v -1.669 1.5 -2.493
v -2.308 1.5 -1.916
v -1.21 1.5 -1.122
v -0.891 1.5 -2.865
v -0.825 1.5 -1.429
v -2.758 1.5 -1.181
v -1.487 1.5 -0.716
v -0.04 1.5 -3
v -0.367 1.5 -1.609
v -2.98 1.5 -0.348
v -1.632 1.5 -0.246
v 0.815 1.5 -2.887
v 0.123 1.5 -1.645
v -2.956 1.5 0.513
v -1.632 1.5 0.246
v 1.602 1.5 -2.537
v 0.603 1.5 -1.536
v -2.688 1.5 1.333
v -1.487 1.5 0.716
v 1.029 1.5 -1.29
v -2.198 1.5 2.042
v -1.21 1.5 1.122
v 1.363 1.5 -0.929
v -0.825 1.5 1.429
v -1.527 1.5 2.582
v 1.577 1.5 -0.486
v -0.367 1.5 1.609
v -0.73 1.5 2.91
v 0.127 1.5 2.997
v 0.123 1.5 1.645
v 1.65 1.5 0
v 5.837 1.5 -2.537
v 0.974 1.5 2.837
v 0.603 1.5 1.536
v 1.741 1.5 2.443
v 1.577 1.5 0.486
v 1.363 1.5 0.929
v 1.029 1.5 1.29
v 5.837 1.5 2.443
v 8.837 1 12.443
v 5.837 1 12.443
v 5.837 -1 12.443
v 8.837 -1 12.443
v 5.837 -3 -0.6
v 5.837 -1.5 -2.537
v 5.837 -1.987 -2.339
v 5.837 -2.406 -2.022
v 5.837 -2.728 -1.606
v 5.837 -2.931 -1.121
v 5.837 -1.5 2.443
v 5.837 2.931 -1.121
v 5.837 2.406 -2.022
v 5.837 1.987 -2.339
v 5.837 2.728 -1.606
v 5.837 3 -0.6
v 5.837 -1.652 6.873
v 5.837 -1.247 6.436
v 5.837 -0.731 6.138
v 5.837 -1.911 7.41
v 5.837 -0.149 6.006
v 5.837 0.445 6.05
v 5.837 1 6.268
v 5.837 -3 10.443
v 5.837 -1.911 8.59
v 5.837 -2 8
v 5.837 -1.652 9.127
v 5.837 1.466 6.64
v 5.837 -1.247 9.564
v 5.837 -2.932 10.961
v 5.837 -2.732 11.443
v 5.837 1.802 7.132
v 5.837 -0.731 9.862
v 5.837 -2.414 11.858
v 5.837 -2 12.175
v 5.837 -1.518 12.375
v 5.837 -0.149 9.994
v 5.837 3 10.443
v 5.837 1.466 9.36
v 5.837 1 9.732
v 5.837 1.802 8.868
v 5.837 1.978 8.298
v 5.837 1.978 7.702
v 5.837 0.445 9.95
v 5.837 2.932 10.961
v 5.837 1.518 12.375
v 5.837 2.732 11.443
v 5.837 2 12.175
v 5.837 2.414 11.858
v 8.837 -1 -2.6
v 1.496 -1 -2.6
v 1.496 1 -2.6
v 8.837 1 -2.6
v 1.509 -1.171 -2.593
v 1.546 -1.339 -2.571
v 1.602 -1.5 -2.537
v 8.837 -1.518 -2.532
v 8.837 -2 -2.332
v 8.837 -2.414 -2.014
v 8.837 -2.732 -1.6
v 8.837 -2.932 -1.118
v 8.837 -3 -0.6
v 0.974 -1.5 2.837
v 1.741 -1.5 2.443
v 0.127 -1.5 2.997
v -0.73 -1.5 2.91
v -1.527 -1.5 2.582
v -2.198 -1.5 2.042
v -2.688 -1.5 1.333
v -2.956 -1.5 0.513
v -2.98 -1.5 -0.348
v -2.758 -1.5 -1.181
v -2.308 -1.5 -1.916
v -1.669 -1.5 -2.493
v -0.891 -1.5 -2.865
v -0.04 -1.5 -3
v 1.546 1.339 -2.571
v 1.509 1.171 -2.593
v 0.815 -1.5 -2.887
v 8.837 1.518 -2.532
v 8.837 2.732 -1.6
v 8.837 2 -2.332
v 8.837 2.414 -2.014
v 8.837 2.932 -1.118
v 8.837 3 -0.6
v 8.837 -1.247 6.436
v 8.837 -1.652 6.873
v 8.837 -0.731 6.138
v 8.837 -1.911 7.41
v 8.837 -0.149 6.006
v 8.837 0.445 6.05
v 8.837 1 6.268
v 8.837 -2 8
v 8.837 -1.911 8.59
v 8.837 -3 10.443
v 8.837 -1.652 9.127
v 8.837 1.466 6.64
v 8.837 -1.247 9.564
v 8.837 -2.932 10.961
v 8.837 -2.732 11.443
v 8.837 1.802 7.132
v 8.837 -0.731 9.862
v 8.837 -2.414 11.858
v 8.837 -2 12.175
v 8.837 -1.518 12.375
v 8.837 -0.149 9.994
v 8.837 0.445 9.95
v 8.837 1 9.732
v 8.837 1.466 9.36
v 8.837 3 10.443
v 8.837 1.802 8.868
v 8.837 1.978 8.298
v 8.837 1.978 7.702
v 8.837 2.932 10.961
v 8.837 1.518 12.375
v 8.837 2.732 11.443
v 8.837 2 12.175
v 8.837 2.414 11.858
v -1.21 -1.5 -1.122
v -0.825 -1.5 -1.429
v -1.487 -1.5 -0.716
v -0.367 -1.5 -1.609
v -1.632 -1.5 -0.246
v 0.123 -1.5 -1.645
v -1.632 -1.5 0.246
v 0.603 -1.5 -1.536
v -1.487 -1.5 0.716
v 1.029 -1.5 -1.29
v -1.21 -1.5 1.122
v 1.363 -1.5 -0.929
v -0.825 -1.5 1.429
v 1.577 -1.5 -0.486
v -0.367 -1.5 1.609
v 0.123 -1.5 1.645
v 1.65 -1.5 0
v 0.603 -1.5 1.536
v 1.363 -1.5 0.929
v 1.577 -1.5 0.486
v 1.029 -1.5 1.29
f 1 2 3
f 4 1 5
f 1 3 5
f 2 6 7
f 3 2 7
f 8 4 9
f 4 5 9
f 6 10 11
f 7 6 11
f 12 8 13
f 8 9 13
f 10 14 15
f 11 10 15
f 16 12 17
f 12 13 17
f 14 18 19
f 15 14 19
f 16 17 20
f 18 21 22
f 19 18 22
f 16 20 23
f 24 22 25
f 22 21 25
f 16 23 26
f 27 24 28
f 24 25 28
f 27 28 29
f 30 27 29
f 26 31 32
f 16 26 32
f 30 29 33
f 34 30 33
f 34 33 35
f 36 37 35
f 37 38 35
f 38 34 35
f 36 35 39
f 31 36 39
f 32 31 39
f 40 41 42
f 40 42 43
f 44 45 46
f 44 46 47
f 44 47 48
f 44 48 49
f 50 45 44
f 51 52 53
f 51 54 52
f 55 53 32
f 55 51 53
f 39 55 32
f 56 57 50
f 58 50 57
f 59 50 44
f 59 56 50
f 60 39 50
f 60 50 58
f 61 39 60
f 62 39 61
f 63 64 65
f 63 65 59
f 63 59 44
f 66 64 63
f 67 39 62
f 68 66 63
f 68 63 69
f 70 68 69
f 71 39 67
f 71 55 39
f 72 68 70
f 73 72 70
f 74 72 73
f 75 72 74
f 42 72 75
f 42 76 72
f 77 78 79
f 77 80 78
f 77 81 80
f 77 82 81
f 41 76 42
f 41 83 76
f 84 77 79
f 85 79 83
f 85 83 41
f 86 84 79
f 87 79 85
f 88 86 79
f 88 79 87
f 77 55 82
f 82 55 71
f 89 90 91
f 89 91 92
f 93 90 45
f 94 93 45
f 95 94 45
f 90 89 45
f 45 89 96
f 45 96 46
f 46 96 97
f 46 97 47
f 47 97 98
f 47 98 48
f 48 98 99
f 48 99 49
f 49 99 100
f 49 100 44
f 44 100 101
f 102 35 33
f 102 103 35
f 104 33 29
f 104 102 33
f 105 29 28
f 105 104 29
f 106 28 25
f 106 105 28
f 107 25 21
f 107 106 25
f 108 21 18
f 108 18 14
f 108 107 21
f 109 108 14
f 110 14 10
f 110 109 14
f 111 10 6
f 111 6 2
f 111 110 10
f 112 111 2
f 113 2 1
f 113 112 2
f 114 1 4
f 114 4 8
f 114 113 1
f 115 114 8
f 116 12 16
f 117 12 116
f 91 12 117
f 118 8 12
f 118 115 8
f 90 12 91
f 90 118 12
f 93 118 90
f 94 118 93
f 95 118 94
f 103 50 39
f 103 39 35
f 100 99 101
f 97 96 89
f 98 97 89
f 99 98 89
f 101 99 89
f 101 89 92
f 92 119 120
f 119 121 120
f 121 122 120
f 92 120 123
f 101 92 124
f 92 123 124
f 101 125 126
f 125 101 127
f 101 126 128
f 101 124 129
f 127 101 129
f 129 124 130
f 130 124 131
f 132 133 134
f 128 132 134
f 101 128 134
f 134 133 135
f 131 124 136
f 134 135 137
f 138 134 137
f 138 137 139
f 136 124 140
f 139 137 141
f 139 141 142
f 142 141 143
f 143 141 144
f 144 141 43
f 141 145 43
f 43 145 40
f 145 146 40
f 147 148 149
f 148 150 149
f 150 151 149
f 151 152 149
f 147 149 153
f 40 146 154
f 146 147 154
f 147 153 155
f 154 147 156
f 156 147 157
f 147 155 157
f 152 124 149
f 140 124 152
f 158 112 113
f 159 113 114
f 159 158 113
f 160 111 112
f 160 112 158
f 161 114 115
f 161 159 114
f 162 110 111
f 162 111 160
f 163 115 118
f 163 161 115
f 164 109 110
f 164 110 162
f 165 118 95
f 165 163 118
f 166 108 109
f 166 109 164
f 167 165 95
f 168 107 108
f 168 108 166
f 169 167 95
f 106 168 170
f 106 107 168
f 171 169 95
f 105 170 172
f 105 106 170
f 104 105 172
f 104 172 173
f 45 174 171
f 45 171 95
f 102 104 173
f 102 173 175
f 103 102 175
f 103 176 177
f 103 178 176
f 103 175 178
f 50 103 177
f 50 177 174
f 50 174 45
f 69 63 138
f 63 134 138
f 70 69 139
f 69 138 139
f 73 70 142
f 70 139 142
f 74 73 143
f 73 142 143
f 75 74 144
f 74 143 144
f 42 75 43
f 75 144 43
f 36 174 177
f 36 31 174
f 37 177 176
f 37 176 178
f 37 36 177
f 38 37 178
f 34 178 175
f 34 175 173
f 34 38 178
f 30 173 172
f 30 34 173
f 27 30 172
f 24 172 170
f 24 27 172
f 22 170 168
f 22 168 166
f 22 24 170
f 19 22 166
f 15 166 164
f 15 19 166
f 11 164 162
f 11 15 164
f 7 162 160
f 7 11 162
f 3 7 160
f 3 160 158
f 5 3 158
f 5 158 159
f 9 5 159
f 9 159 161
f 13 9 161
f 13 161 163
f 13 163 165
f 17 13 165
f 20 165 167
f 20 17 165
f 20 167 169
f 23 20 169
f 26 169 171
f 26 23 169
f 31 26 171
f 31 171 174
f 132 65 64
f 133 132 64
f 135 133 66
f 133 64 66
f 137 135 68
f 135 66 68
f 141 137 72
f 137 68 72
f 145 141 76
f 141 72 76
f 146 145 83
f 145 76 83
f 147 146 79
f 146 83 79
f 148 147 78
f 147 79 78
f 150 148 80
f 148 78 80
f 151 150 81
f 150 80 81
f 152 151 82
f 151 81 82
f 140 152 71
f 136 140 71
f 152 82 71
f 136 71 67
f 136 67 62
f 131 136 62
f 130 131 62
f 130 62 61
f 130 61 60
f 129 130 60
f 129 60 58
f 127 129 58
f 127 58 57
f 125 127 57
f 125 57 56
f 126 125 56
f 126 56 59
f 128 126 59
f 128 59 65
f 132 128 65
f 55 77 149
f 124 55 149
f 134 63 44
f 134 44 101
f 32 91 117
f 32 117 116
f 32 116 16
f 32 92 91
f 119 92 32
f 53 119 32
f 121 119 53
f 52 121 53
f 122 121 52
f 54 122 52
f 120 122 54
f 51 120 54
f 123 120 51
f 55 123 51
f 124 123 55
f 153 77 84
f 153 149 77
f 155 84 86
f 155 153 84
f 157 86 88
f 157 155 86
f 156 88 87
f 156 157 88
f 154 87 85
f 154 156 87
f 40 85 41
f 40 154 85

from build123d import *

# Parameters (mm, degrees)
F0_R          = 3
F0_R_2        = 1.65
F1_DEPTH      = 1.5
F1_DEPTH_BACK = 1.5
F3_DEPTH      = 1.5
F3_DEPTH_BACK = 1.5
F4_W          = 3
F4_H          = 15.04355
F5_DEPTH      = 3
F5_DEPTH_BACK = 3
F6_R          = 2
F7_DEPTH      = 25
F8_R          = 2


with BuildPart() as f1:
    # F0 (on Front) → F1 (new body, two sides)
    with BuildSketch(Plane.XZ) as f1_sk:
        Circle(F0_R)
        Circle(F0_R_2, mode=Mode.SUBTRACT)
    extrude(amount=F1_DEPTH)
    extrude(f1_sk.sketch, amount=-F1_DEPTH_BACK)

    # F2 (on Front) → F3 (join, two sides)
    with BuildSketch(Plane.XZ) as f3_sk:
        with BuildLine():
            Line((7.740623, 2.443406), (1.740623, 2.443406))
            ThreePointArc((1.740623, 2.443406), (2.666633, 1.374433), (3, 0))
            ThreePointArc((3, 0), (2.59704, -1.501793), (1.496413, -2.600144))
            Line((1.496413, -2.600144), (7.740623, -2.600144))
            Line((7.740623, -2.600144), (7.740623, 2.443406))
        make_face()
    extrude(amount=F3_DEPTH)
    extrude(f3_sk.sketch, amount=-F3_DEPTH_BACK)

    # F4 (on Front) → F5 (join, two sides)
    with BuildSketch(Plane.XZ) as f5_sk:
        with Locations((7.336591, 4.921631)):
            Rectangle(F4_W, F4_H)
    extrude(amount=F5_DEPTH)
    extrude(f5_sk.sketch, amount=-F5_DEPTH_BACK)

    # F6 (on face) → F7 (cut)
    with BuildSketch(Plane(origin=(5.836591, 0, 0), x_dir=(0, -1, 0), z_dir=(-1, 0, 0))):
        with Locations((0, 8)):
            Circle(F6_R)
    extrude(amount=-F7_DEPTH, mode=Mode.SUBTRACT)

    # F8
    f8_edges = [f1.edges().sort_by_distance(p)[0] for p in [
        (7.336591, -3, 12.443406),
        (7.336591, 3, 12.443406),
        (7.336591, -3, -2.600144),
        (7.336591, 3, -2.600144),
    ]]
    fillet(f8_edges, radius=F8_R)


solid = f1.part
